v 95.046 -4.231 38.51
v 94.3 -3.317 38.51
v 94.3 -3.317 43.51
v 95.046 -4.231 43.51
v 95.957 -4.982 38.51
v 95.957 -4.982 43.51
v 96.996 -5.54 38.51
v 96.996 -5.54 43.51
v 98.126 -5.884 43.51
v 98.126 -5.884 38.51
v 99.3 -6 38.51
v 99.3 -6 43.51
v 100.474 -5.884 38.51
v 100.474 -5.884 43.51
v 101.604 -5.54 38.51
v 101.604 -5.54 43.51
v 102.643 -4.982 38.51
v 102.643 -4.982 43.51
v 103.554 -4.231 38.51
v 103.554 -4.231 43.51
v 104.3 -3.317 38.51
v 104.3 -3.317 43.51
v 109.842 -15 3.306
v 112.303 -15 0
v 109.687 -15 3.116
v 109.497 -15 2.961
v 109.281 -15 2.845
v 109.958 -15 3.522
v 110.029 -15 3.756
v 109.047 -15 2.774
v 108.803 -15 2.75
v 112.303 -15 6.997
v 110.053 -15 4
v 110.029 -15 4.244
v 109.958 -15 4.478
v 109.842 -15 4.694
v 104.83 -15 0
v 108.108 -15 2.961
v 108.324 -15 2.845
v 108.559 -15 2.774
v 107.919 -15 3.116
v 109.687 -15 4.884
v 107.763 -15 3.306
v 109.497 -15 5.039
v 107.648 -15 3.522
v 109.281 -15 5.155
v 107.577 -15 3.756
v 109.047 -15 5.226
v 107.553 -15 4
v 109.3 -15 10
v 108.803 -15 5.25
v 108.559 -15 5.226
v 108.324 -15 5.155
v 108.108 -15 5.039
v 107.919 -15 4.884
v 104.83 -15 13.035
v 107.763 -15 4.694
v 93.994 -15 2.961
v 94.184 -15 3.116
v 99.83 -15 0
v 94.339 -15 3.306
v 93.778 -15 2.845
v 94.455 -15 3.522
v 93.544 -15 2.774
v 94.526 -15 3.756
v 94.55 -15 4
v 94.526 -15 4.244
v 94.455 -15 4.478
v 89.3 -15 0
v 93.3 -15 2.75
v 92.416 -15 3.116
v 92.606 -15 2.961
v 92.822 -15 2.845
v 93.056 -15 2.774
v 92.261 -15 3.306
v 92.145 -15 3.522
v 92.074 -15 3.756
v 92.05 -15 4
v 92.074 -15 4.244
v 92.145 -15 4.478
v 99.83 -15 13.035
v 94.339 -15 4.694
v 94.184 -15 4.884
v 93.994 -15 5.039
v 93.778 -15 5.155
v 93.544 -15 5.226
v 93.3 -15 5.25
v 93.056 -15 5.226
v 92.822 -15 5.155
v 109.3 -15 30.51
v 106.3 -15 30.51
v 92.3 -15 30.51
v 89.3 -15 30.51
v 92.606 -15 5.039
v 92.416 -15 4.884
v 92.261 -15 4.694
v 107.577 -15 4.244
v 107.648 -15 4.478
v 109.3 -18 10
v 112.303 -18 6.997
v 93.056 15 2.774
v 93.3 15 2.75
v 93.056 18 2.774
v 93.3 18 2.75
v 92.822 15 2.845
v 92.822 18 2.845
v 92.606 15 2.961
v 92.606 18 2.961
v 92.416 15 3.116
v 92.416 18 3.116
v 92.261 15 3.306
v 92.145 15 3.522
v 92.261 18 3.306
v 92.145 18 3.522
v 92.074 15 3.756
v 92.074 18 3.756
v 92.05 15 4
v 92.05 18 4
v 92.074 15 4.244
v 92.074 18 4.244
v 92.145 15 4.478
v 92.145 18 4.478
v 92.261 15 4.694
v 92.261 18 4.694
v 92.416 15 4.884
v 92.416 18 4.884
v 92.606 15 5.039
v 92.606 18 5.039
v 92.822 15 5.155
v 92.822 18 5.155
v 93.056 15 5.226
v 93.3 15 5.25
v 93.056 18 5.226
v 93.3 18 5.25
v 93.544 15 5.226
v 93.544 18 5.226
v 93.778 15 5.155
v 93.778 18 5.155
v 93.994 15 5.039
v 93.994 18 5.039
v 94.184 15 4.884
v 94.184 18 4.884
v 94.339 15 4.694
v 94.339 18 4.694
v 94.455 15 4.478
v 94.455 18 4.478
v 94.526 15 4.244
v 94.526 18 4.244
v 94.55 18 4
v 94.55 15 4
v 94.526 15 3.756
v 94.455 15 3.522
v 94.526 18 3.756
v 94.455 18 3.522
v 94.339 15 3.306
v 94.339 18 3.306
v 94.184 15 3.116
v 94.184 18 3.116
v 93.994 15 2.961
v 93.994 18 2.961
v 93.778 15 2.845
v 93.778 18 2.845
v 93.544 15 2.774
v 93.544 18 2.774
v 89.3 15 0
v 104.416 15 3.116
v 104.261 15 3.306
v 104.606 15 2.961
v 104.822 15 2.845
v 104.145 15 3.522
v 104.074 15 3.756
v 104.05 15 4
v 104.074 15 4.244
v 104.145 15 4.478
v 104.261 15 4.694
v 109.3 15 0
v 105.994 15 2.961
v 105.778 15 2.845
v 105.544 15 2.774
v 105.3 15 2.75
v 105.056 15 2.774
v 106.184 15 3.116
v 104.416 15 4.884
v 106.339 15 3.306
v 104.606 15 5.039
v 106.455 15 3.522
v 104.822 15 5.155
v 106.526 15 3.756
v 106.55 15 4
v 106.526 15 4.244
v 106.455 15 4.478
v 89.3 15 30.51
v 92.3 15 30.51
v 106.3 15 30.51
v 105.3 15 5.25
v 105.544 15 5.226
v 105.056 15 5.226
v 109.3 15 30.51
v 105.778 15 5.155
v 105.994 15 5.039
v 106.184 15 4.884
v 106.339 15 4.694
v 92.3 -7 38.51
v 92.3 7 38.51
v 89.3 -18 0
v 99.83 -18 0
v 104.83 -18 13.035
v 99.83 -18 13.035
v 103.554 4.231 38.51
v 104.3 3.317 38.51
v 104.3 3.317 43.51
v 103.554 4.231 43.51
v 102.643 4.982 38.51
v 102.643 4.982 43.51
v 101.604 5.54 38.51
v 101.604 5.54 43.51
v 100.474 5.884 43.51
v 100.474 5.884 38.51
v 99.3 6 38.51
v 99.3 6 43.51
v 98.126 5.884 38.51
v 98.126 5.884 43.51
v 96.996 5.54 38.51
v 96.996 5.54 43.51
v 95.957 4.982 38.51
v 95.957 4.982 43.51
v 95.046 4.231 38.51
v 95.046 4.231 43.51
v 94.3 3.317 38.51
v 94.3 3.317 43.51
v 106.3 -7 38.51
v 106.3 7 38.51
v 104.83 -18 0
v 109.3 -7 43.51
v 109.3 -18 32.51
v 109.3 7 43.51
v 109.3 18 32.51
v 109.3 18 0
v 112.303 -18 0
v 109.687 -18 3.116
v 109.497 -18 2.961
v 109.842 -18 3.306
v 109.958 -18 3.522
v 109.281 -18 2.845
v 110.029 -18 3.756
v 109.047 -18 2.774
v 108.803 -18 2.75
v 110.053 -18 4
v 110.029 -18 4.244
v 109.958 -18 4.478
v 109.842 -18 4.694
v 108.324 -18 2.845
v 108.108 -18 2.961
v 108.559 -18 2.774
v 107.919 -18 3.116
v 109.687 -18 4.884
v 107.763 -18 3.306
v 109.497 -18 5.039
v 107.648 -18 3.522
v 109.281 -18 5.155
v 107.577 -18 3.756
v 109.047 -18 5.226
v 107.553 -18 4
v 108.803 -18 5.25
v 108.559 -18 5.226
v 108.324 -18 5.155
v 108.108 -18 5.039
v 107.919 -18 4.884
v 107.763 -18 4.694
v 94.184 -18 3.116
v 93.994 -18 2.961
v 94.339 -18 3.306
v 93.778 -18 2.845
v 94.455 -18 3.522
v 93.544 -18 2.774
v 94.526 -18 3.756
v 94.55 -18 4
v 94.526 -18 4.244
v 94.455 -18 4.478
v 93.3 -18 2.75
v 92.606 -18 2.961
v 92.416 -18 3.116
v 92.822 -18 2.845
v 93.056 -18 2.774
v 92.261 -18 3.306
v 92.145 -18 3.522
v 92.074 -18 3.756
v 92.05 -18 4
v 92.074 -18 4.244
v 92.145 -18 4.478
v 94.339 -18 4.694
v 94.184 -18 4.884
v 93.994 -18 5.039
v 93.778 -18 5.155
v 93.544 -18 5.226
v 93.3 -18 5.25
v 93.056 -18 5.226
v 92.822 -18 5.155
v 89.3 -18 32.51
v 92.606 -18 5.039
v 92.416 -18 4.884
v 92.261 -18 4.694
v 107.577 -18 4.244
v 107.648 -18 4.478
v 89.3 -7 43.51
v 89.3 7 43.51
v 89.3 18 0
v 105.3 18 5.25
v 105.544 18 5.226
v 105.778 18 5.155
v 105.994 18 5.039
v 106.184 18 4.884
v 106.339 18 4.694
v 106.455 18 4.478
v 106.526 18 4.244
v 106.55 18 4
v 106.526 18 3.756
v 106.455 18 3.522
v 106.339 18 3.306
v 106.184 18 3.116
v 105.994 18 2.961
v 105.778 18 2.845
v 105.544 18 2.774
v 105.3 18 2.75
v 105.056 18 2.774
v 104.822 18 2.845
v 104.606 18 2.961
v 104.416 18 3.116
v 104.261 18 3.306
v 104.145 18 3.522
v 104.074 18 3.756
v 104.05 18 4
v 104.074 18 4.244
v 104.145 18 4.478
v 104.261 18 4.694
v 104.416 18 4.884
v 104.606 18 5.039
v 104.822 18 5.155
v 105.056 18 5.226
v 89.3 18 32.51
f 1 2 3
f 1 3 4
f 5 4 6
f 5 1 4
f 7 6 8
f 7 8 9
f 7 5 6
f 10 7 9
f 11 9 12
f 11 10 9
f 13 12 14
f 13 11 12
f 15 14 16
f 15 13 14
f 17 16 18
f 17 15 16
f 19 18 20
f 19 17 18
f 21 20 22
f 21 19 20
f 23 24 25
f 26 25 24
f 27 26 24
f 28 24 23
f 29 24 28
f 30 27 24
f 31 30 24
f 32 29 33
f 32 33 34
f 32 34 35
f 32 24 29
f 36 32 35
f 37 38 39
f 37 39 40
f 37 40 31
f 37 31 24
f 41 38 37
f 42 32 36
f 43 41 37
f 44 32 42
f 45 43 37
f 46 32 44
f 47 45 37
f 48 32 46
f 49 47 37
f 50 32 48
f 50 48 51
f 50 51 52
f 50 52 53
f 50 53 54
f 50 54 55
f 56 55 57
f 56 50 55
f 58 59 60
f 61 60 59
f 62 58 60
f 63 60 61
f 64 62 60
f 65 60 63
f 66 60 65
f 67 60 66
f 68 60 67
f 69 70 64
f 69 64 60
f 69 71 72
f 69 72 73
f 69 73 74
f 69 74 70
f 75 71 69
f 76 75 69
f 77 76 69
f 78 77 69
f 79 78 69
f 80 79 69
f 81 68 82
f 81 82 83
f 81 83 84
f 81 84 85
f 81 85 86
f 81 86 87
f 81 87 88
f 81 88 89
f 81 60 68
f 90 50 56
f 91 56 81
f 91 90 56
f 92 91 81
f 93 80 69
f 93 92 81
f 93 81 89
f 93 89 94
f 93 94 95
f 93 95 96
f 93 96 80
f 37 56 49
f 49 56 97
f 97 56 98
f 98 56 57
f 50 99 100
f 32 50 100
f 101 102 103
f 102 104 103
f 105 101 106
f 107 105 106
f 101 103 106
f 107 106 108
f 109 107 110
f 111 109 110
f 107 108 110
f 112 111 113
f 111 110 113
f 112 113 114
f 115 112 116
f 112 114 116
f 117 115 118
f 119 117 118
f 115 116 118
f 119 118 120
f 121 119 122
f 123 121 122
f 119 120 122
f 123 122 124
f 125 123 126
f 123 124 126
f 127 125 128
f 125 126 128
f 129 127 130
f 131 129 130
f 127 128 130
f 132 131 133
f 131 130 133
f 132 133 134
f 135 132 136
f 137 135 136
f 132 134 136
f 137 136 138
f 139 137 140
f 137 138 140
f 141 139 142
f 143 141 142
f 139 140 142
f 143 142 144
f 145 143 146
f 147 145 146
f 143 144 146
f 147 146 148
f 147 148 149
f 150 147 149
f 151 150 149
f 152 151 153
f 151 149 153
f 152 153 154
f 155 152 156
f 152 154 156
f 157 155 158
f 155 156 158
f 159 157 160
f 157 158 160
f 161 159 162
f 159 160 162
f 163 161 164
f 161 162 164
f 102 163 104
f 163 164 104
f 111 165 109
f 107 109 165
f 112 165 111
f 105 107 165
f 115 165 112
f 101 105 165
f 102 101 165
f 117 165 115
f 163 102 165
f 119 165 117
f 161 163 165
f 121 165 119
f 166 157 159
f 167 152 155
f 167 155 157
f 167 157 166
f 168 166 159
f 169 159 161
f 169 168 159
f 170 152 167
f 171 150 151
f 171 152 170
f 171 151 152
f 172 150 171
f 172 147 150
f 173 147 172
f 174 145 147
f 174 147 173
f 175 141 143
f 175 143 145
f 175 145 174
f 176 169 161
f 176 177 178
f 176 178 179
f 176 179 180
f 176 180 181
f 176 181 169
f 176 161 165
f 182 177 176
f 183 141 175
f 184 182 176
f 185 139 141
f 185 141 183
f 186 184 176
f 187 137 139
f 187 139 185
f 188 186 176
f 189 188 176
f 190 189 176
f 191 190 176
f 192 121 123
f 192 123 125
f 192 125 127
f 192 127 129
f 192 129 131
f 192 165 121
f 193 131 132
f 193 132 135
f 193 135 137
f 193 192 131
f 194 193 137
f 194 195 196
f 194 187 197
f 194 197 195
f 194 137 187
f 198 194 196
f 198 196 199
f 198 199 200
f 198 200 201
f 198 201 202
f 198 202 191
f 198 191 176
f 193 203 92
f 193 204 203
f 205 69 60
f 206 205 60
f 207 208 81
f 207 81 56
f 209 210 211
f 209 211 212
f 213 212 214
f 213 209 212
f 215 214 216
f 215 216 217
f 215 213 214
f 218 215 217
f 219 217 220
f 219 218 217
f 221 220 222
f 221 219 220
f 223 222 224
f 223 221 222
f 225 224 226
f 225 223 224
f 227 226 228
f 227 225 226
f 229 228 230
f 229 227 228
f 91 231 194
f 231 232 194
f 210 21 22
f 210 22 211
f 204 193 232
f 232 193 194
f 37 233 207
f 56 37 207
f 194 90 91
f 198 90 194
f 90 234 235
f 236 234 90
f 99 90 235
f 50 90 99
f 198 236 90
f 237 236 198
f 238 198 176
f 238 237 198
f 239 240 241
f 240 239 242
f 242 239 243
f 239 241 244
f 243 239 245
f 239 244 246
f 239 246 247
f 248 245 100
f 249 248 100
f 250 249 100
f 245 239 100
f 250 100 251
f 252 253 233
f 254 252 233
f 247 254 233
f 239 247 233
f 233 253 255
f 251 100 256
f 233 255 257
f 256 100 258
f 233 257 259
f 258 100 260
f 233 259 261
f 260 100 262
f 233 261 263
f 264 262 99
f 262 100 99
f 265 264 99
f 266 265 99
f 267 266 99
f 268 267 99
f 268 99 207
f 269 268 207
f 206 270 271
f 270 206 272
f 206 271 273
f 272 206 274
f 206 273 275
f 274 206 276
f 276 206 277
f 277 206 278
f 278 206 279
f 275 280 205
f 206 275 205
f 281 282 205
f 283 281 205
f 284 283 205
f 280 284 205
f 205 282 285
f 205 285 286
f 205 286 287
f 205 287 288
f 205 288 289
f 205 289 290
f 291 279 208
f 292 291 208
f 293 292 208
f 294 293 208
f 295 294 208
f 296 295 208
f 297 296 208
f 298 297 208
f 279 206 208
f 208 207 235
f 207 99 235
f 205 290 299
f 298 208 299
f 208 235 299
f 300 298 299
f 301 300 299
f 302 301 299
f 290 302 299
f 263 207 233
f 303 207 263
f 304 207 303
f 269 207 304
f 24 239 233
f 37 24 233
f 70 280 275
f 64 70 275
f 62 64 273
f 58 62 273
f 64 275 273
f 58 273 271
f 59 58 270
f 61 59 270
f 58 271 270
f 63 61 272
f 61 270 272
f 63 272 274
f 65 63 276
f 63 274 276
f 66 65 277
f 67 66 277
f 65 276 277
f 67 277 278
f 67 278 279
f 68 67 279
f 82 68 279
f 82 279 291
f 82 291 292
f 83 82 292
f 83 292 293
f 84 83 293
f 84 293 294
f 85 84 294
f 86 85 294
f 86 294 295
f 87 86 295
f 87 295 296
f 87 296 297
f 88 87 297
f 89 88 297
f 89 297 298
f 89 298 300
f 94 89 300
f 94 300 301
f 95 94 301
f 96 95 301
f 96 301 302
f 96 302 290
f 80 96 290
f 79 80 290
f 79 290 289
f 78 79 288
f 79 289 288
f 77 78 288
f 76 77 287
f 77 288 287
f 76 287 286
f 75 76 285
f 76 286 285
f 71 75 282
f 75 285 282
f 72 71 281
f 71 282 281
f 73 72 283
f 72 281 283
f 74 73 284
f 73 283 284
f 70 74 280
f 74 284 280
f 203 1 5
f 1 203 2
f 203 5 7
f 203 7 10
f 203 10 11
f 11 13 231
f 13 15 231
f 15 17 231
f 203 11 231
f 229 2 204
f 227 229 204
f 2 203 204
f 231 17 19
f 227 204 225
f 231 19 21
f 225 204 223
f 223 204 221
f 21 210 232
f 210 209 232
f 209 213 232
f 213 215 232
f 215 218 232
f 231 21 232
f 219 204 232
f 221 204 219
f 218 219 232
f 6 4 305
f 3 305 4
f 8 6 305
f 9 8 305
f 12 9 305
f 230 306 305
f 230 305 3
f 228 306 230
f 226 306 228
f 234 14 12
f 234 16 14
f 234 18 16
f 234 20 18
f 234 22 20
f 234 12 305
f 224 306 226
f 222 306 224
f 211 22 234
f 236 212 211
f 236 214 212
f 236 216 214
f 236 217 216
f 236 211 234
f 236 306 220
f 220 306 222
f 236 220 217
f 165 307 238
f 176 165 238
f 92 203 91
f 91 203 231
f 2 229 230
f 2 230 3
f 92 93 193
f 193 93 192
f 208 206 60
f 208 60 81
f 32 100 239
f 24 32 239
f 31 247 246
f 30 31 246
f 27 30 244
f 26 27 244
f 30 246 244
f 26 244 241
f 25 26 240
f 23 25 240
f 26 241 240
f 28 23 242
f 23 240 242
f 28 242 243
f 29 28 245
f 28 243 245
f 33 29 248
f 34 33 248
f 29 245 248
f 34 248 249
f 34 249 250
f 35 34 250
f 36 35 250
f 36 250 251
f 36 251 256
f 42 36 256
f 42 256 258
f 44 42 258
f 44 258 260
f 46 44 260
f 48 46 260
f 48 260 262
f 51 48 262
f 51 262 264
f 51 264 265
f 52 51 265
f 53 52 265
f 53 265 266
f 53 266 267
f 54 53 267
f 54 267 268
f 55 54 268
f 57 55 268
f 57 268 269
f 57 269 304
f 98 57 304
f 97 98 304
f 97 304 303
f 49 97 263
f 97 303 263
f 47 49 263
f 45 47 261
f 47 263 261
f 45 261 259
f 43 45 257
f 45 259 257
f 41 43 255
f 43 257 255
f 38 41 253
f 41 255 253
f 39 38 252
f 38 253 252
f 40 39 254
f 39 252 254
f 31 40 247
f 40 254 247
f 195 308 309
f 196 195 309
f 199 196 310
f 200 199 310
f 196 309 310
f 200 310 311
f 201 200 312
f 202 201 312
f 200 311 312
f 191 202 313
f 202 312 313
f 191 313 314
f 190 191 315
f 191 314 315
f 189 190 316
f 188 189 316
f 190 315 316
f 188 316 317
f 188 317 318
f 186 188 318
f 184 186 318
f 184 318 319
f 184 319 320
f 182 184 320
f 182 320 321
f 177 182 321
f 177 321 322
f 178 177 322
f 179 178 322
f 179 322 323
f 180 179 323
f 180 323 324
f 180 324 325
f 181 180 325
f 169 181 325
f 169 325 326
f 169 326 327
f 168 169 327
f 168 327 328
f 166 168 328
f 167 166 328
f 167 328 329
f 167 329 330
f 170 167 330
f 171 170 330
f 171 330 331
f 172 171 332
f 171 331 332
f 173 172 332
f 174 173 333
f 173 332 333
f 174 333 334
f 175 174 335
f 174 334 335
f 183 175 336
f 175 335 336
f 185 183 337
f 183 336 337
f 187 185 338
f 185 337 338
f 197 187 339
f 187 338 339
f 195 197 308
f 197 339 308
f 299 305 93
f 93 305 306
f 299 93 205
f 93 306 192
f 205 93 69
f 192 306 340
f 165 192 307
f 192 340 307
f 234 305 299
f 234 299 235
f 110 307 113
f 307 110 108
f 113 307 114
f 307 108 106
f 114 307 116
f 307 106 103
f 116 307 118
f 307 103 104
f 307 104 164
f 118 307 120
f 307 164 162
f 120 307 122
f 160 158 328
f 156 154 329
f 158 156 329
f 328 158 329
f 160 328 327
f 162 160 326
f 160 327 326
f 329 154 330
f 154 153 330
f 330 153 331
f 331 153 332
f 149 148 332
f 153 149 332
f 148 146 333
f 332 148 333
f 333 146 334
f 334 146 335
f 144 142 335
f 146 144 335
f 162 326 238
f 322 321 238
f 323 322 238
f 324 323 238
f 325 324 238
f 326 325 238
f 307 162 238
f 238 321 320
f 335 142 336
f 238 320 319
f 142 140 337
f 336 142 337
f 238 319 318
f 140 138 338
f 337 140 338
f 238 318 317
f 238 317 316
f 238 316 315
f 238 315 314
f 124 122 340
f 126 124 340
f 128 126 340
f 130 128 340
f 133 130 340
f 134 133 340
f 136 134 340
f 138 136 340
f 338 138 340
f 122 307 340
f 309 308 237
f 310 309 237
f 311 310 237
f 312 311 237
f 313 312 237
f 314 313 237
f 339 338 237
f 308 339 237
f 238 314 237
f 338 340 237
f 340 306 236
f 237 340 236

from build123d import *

# Parameters (mm, degrees)
SKETCH_2_W          = 20
SKETCH_2_H          = 30
EXTRUDE_1_DEPTH     = 5
SKETCH_5_W          = 20
SKETCH_5_H          = 3
EXTRUDE_3_DEPTH     = 43.51
CUT_EXTRUDE_2_REACH = 125.027
SKETCH_6_W          = 5
SKETCH_6_H          = 13.035
EXTRUDE_4_DEPTH     = 3
CUT_EXTRUDE_3_REACH = 127.702
SKETCH_8_R          = 1.25
CUT_EXTRUDE_4_REACH = 127.702
SKETCH_9_R          = 1.25
CHAMFER_2_SIZE      = 8
CHAMFER_3_SIZE      = 11
EXTRUDE_6_DEPTH     = 3


with BuildPart() as part:
    # 草图2 → 凸台-拉伸1 (new body)
    with BuildSketch(Plane.XY.offset(38.51)):
        with Locations((99.3, 0)):
            Rectangle(SKETCH_2_W, SKETCH_2_H)
        with BuildLine():
            Line((104.3, -3.31662479), (104.3, 3.31662479))
            ThreePointArc((104.3, 3.31662479), (99.3, 6), (94.3, 3.31662479))
            Line((94.3, 3.31662479), (94.3, -3.31662479))
            ThreePointArc((94.3, -3.31662479), (99.3, -6), (104.3, -3.31662479))
        make_face(mode=Mode.SUBTRACT)
    extrude(amount=EXTRUDE_1_DEPTH)

    # 草图5 → 凸台-拉伸3 (add)
    with BuildSketch(Plane.XY.offset(43.51)):
        with Locations((99.3, 16.5)):
            Rectangle(SKETCH_5_W, SKETCH_5_H)
        with Locations((99.3, -16.5)):
            Rectangle(SKETCH_5_W, SKETCH_5_H)
    extrude(amount=-EXTRUDE_3_DEPTH)

    # 草图6 → 切除-拉伸2 (cut, up to next)
    with BuildSketch(Plane.XZ.offset(18), mode=Mode.PRIVATE) as cut_extrude_2_sk1:
        with Locations((102.329663749, 6.5175)):
            Rectangle(SKETCH_6_W, SKETCH_6_H)
    cut_extrude_2_tool1 = extrude(cut_extrude_2_sk1.sketch, amount=-CUT_EXTRUDE_2_REACH, mode=Mode.PRIVATE) & part.part
    add(cut_extrude_2_tool1.solids().sort_by_distance((102.329664, -18, 6.5175))[0], mode=Mode.SUBTRACT)

    # 草图7 → 凸台-拉伸4 (add)
    with BuildSketch(Plane.XZ.offset(18)):
        Polygon((109.3, 10), (112.302663002, 6.997336998), (112.302663002, 0), (109.3, 0), align=None)
    extrude(amount=-EXTRUDE_4_DEPTH)

    # 草图8 → 切除-拉伸3 (cut, up to next)
    with BuildSketch(Plane.XZ.offset(18), mode=Mode.PRIVATE) as cut_extrude_3_sk1:
        with Locations(Location((93.3, 4, 0), (0, 0, 270))):
            Circle(SKETCH_8_R)
    cut_extrude_3_tool1 = extrude(cut_extrude_3_sk1.sketch, amount=-CUT_EXTRUDE_3_REACH, mode=Mode.PRIVATE) & part.part
    # 草图8 → 切除-拉伸3 (cut, up to next)
    with BuildSketch(Plane.XZ.offset(18), mode=Mode.PRIVATE) as cut_extrude_3_sk2:
        with Locations(Location((108.802663002, 4, 0), (0, 0, 270))):
            Circle(SKETCH_8_R)
    cut_extrude_3_tool2 = extrude(cut_extrude_3_sk2.sketch, amount=-CUT_EXTRUDE_3_REACH, mode=Mode.PRIVATE) & part.part
    add(cut_extrude_3_tool1.solids().sort_by_distance((93.3, -18, 4))[0], mode=Mode.SUBTRACT)
    add(cut_extrude_3_tool2.solids().sort_by_distance((108.802663, -18, 4))[0], mode=Mode.SUBTRACT)

    # 草图9 → 切除-拉伸4 (cut, up to next)
    with BuildSketch(Plane(origin=(0, 18, 0), x_dir=(1, 0, 0), z_dir=(0, 1, 0)), mode=Mode.PRIVATE) as cut_extrude_4_sk1:
        with Locations(Location((105.3, -4, 0), (0, 0, 270))):
            Circle(SKETCH_9_R)
    cut_extrude_4_tool1 = extrude(cut_extrude_4_sk1.sketch, amount=-CUT_EXTRUDE_4_REACH, mode=Mode.PRIVATE) & part.part
    # 草图9 → 切除-拉伸4 (cut, up to next)
    with BuildSketch(Plane(origin=(0, 18, 0), x_dir=(1, 0, 0), z_dir=(0, 1, 0)), mode=Mode.PRIVATE) as cut_extrude_4_sk2:
        with Locations(Location((93.3, -4, 0), (0, 0, 90))):
            Circle(SKETCH_9_R)
    cut_extrude_4_tool2 = extrude(cut_extrude_4_sk2.sketch, amount=-CUT_EXTRUDE_4_REACH, mode=Mode.PRIVATE) & part.part
    add(cut_extrude_4_tool1.solids().sort_by_distance((105.3, 18, 4))[0], mode=Mode.SUBTRACT)
    add(cut_extrude_4_tool2.solids().sort_by_distance((93.3, 18, 4))[0], mode=Mode.SUBTRACT)

    # 倒角2
    chamfer_2_edges = [part.edges().sort_by_distance(p)[0] for p in [
        (99.3, -15, 38.51),
        (99.3, 15, 38.51),
    ]]
    chamfer(chamfer_2_edges, length=CHAMFER_2_SIZE)

    # 倒角3
    chamfer_3_edges = [part.edges().sort_by_distance(p)[0] for p in [
        (99.3, 18, 43.51),
        (99.3, -18, 43.51),
    ]]
    chamfer(chamfer_3_edges, length=CHAMFER_3_SIZE)

    # 草图14 → 凸台-拉伸6 (add)
    with BuildSketch(Plane.ZY.offset(-89.3)):
        Polygon((38.51, -7), (30.51, -15), (30.51, 15), (38.51, 7), align=None)
    extrude_6 = extrude(amount=-EXTRUDE_6_DEPTH)

    # 镜向1: 凸台-拉伸6 across plane
    add(extrude_6.mirror(Plane(origin=(99.3, 0, 0), x_dir=(0, 0, 1), z_dir=(1, 0, 0))))


solid = part.part
